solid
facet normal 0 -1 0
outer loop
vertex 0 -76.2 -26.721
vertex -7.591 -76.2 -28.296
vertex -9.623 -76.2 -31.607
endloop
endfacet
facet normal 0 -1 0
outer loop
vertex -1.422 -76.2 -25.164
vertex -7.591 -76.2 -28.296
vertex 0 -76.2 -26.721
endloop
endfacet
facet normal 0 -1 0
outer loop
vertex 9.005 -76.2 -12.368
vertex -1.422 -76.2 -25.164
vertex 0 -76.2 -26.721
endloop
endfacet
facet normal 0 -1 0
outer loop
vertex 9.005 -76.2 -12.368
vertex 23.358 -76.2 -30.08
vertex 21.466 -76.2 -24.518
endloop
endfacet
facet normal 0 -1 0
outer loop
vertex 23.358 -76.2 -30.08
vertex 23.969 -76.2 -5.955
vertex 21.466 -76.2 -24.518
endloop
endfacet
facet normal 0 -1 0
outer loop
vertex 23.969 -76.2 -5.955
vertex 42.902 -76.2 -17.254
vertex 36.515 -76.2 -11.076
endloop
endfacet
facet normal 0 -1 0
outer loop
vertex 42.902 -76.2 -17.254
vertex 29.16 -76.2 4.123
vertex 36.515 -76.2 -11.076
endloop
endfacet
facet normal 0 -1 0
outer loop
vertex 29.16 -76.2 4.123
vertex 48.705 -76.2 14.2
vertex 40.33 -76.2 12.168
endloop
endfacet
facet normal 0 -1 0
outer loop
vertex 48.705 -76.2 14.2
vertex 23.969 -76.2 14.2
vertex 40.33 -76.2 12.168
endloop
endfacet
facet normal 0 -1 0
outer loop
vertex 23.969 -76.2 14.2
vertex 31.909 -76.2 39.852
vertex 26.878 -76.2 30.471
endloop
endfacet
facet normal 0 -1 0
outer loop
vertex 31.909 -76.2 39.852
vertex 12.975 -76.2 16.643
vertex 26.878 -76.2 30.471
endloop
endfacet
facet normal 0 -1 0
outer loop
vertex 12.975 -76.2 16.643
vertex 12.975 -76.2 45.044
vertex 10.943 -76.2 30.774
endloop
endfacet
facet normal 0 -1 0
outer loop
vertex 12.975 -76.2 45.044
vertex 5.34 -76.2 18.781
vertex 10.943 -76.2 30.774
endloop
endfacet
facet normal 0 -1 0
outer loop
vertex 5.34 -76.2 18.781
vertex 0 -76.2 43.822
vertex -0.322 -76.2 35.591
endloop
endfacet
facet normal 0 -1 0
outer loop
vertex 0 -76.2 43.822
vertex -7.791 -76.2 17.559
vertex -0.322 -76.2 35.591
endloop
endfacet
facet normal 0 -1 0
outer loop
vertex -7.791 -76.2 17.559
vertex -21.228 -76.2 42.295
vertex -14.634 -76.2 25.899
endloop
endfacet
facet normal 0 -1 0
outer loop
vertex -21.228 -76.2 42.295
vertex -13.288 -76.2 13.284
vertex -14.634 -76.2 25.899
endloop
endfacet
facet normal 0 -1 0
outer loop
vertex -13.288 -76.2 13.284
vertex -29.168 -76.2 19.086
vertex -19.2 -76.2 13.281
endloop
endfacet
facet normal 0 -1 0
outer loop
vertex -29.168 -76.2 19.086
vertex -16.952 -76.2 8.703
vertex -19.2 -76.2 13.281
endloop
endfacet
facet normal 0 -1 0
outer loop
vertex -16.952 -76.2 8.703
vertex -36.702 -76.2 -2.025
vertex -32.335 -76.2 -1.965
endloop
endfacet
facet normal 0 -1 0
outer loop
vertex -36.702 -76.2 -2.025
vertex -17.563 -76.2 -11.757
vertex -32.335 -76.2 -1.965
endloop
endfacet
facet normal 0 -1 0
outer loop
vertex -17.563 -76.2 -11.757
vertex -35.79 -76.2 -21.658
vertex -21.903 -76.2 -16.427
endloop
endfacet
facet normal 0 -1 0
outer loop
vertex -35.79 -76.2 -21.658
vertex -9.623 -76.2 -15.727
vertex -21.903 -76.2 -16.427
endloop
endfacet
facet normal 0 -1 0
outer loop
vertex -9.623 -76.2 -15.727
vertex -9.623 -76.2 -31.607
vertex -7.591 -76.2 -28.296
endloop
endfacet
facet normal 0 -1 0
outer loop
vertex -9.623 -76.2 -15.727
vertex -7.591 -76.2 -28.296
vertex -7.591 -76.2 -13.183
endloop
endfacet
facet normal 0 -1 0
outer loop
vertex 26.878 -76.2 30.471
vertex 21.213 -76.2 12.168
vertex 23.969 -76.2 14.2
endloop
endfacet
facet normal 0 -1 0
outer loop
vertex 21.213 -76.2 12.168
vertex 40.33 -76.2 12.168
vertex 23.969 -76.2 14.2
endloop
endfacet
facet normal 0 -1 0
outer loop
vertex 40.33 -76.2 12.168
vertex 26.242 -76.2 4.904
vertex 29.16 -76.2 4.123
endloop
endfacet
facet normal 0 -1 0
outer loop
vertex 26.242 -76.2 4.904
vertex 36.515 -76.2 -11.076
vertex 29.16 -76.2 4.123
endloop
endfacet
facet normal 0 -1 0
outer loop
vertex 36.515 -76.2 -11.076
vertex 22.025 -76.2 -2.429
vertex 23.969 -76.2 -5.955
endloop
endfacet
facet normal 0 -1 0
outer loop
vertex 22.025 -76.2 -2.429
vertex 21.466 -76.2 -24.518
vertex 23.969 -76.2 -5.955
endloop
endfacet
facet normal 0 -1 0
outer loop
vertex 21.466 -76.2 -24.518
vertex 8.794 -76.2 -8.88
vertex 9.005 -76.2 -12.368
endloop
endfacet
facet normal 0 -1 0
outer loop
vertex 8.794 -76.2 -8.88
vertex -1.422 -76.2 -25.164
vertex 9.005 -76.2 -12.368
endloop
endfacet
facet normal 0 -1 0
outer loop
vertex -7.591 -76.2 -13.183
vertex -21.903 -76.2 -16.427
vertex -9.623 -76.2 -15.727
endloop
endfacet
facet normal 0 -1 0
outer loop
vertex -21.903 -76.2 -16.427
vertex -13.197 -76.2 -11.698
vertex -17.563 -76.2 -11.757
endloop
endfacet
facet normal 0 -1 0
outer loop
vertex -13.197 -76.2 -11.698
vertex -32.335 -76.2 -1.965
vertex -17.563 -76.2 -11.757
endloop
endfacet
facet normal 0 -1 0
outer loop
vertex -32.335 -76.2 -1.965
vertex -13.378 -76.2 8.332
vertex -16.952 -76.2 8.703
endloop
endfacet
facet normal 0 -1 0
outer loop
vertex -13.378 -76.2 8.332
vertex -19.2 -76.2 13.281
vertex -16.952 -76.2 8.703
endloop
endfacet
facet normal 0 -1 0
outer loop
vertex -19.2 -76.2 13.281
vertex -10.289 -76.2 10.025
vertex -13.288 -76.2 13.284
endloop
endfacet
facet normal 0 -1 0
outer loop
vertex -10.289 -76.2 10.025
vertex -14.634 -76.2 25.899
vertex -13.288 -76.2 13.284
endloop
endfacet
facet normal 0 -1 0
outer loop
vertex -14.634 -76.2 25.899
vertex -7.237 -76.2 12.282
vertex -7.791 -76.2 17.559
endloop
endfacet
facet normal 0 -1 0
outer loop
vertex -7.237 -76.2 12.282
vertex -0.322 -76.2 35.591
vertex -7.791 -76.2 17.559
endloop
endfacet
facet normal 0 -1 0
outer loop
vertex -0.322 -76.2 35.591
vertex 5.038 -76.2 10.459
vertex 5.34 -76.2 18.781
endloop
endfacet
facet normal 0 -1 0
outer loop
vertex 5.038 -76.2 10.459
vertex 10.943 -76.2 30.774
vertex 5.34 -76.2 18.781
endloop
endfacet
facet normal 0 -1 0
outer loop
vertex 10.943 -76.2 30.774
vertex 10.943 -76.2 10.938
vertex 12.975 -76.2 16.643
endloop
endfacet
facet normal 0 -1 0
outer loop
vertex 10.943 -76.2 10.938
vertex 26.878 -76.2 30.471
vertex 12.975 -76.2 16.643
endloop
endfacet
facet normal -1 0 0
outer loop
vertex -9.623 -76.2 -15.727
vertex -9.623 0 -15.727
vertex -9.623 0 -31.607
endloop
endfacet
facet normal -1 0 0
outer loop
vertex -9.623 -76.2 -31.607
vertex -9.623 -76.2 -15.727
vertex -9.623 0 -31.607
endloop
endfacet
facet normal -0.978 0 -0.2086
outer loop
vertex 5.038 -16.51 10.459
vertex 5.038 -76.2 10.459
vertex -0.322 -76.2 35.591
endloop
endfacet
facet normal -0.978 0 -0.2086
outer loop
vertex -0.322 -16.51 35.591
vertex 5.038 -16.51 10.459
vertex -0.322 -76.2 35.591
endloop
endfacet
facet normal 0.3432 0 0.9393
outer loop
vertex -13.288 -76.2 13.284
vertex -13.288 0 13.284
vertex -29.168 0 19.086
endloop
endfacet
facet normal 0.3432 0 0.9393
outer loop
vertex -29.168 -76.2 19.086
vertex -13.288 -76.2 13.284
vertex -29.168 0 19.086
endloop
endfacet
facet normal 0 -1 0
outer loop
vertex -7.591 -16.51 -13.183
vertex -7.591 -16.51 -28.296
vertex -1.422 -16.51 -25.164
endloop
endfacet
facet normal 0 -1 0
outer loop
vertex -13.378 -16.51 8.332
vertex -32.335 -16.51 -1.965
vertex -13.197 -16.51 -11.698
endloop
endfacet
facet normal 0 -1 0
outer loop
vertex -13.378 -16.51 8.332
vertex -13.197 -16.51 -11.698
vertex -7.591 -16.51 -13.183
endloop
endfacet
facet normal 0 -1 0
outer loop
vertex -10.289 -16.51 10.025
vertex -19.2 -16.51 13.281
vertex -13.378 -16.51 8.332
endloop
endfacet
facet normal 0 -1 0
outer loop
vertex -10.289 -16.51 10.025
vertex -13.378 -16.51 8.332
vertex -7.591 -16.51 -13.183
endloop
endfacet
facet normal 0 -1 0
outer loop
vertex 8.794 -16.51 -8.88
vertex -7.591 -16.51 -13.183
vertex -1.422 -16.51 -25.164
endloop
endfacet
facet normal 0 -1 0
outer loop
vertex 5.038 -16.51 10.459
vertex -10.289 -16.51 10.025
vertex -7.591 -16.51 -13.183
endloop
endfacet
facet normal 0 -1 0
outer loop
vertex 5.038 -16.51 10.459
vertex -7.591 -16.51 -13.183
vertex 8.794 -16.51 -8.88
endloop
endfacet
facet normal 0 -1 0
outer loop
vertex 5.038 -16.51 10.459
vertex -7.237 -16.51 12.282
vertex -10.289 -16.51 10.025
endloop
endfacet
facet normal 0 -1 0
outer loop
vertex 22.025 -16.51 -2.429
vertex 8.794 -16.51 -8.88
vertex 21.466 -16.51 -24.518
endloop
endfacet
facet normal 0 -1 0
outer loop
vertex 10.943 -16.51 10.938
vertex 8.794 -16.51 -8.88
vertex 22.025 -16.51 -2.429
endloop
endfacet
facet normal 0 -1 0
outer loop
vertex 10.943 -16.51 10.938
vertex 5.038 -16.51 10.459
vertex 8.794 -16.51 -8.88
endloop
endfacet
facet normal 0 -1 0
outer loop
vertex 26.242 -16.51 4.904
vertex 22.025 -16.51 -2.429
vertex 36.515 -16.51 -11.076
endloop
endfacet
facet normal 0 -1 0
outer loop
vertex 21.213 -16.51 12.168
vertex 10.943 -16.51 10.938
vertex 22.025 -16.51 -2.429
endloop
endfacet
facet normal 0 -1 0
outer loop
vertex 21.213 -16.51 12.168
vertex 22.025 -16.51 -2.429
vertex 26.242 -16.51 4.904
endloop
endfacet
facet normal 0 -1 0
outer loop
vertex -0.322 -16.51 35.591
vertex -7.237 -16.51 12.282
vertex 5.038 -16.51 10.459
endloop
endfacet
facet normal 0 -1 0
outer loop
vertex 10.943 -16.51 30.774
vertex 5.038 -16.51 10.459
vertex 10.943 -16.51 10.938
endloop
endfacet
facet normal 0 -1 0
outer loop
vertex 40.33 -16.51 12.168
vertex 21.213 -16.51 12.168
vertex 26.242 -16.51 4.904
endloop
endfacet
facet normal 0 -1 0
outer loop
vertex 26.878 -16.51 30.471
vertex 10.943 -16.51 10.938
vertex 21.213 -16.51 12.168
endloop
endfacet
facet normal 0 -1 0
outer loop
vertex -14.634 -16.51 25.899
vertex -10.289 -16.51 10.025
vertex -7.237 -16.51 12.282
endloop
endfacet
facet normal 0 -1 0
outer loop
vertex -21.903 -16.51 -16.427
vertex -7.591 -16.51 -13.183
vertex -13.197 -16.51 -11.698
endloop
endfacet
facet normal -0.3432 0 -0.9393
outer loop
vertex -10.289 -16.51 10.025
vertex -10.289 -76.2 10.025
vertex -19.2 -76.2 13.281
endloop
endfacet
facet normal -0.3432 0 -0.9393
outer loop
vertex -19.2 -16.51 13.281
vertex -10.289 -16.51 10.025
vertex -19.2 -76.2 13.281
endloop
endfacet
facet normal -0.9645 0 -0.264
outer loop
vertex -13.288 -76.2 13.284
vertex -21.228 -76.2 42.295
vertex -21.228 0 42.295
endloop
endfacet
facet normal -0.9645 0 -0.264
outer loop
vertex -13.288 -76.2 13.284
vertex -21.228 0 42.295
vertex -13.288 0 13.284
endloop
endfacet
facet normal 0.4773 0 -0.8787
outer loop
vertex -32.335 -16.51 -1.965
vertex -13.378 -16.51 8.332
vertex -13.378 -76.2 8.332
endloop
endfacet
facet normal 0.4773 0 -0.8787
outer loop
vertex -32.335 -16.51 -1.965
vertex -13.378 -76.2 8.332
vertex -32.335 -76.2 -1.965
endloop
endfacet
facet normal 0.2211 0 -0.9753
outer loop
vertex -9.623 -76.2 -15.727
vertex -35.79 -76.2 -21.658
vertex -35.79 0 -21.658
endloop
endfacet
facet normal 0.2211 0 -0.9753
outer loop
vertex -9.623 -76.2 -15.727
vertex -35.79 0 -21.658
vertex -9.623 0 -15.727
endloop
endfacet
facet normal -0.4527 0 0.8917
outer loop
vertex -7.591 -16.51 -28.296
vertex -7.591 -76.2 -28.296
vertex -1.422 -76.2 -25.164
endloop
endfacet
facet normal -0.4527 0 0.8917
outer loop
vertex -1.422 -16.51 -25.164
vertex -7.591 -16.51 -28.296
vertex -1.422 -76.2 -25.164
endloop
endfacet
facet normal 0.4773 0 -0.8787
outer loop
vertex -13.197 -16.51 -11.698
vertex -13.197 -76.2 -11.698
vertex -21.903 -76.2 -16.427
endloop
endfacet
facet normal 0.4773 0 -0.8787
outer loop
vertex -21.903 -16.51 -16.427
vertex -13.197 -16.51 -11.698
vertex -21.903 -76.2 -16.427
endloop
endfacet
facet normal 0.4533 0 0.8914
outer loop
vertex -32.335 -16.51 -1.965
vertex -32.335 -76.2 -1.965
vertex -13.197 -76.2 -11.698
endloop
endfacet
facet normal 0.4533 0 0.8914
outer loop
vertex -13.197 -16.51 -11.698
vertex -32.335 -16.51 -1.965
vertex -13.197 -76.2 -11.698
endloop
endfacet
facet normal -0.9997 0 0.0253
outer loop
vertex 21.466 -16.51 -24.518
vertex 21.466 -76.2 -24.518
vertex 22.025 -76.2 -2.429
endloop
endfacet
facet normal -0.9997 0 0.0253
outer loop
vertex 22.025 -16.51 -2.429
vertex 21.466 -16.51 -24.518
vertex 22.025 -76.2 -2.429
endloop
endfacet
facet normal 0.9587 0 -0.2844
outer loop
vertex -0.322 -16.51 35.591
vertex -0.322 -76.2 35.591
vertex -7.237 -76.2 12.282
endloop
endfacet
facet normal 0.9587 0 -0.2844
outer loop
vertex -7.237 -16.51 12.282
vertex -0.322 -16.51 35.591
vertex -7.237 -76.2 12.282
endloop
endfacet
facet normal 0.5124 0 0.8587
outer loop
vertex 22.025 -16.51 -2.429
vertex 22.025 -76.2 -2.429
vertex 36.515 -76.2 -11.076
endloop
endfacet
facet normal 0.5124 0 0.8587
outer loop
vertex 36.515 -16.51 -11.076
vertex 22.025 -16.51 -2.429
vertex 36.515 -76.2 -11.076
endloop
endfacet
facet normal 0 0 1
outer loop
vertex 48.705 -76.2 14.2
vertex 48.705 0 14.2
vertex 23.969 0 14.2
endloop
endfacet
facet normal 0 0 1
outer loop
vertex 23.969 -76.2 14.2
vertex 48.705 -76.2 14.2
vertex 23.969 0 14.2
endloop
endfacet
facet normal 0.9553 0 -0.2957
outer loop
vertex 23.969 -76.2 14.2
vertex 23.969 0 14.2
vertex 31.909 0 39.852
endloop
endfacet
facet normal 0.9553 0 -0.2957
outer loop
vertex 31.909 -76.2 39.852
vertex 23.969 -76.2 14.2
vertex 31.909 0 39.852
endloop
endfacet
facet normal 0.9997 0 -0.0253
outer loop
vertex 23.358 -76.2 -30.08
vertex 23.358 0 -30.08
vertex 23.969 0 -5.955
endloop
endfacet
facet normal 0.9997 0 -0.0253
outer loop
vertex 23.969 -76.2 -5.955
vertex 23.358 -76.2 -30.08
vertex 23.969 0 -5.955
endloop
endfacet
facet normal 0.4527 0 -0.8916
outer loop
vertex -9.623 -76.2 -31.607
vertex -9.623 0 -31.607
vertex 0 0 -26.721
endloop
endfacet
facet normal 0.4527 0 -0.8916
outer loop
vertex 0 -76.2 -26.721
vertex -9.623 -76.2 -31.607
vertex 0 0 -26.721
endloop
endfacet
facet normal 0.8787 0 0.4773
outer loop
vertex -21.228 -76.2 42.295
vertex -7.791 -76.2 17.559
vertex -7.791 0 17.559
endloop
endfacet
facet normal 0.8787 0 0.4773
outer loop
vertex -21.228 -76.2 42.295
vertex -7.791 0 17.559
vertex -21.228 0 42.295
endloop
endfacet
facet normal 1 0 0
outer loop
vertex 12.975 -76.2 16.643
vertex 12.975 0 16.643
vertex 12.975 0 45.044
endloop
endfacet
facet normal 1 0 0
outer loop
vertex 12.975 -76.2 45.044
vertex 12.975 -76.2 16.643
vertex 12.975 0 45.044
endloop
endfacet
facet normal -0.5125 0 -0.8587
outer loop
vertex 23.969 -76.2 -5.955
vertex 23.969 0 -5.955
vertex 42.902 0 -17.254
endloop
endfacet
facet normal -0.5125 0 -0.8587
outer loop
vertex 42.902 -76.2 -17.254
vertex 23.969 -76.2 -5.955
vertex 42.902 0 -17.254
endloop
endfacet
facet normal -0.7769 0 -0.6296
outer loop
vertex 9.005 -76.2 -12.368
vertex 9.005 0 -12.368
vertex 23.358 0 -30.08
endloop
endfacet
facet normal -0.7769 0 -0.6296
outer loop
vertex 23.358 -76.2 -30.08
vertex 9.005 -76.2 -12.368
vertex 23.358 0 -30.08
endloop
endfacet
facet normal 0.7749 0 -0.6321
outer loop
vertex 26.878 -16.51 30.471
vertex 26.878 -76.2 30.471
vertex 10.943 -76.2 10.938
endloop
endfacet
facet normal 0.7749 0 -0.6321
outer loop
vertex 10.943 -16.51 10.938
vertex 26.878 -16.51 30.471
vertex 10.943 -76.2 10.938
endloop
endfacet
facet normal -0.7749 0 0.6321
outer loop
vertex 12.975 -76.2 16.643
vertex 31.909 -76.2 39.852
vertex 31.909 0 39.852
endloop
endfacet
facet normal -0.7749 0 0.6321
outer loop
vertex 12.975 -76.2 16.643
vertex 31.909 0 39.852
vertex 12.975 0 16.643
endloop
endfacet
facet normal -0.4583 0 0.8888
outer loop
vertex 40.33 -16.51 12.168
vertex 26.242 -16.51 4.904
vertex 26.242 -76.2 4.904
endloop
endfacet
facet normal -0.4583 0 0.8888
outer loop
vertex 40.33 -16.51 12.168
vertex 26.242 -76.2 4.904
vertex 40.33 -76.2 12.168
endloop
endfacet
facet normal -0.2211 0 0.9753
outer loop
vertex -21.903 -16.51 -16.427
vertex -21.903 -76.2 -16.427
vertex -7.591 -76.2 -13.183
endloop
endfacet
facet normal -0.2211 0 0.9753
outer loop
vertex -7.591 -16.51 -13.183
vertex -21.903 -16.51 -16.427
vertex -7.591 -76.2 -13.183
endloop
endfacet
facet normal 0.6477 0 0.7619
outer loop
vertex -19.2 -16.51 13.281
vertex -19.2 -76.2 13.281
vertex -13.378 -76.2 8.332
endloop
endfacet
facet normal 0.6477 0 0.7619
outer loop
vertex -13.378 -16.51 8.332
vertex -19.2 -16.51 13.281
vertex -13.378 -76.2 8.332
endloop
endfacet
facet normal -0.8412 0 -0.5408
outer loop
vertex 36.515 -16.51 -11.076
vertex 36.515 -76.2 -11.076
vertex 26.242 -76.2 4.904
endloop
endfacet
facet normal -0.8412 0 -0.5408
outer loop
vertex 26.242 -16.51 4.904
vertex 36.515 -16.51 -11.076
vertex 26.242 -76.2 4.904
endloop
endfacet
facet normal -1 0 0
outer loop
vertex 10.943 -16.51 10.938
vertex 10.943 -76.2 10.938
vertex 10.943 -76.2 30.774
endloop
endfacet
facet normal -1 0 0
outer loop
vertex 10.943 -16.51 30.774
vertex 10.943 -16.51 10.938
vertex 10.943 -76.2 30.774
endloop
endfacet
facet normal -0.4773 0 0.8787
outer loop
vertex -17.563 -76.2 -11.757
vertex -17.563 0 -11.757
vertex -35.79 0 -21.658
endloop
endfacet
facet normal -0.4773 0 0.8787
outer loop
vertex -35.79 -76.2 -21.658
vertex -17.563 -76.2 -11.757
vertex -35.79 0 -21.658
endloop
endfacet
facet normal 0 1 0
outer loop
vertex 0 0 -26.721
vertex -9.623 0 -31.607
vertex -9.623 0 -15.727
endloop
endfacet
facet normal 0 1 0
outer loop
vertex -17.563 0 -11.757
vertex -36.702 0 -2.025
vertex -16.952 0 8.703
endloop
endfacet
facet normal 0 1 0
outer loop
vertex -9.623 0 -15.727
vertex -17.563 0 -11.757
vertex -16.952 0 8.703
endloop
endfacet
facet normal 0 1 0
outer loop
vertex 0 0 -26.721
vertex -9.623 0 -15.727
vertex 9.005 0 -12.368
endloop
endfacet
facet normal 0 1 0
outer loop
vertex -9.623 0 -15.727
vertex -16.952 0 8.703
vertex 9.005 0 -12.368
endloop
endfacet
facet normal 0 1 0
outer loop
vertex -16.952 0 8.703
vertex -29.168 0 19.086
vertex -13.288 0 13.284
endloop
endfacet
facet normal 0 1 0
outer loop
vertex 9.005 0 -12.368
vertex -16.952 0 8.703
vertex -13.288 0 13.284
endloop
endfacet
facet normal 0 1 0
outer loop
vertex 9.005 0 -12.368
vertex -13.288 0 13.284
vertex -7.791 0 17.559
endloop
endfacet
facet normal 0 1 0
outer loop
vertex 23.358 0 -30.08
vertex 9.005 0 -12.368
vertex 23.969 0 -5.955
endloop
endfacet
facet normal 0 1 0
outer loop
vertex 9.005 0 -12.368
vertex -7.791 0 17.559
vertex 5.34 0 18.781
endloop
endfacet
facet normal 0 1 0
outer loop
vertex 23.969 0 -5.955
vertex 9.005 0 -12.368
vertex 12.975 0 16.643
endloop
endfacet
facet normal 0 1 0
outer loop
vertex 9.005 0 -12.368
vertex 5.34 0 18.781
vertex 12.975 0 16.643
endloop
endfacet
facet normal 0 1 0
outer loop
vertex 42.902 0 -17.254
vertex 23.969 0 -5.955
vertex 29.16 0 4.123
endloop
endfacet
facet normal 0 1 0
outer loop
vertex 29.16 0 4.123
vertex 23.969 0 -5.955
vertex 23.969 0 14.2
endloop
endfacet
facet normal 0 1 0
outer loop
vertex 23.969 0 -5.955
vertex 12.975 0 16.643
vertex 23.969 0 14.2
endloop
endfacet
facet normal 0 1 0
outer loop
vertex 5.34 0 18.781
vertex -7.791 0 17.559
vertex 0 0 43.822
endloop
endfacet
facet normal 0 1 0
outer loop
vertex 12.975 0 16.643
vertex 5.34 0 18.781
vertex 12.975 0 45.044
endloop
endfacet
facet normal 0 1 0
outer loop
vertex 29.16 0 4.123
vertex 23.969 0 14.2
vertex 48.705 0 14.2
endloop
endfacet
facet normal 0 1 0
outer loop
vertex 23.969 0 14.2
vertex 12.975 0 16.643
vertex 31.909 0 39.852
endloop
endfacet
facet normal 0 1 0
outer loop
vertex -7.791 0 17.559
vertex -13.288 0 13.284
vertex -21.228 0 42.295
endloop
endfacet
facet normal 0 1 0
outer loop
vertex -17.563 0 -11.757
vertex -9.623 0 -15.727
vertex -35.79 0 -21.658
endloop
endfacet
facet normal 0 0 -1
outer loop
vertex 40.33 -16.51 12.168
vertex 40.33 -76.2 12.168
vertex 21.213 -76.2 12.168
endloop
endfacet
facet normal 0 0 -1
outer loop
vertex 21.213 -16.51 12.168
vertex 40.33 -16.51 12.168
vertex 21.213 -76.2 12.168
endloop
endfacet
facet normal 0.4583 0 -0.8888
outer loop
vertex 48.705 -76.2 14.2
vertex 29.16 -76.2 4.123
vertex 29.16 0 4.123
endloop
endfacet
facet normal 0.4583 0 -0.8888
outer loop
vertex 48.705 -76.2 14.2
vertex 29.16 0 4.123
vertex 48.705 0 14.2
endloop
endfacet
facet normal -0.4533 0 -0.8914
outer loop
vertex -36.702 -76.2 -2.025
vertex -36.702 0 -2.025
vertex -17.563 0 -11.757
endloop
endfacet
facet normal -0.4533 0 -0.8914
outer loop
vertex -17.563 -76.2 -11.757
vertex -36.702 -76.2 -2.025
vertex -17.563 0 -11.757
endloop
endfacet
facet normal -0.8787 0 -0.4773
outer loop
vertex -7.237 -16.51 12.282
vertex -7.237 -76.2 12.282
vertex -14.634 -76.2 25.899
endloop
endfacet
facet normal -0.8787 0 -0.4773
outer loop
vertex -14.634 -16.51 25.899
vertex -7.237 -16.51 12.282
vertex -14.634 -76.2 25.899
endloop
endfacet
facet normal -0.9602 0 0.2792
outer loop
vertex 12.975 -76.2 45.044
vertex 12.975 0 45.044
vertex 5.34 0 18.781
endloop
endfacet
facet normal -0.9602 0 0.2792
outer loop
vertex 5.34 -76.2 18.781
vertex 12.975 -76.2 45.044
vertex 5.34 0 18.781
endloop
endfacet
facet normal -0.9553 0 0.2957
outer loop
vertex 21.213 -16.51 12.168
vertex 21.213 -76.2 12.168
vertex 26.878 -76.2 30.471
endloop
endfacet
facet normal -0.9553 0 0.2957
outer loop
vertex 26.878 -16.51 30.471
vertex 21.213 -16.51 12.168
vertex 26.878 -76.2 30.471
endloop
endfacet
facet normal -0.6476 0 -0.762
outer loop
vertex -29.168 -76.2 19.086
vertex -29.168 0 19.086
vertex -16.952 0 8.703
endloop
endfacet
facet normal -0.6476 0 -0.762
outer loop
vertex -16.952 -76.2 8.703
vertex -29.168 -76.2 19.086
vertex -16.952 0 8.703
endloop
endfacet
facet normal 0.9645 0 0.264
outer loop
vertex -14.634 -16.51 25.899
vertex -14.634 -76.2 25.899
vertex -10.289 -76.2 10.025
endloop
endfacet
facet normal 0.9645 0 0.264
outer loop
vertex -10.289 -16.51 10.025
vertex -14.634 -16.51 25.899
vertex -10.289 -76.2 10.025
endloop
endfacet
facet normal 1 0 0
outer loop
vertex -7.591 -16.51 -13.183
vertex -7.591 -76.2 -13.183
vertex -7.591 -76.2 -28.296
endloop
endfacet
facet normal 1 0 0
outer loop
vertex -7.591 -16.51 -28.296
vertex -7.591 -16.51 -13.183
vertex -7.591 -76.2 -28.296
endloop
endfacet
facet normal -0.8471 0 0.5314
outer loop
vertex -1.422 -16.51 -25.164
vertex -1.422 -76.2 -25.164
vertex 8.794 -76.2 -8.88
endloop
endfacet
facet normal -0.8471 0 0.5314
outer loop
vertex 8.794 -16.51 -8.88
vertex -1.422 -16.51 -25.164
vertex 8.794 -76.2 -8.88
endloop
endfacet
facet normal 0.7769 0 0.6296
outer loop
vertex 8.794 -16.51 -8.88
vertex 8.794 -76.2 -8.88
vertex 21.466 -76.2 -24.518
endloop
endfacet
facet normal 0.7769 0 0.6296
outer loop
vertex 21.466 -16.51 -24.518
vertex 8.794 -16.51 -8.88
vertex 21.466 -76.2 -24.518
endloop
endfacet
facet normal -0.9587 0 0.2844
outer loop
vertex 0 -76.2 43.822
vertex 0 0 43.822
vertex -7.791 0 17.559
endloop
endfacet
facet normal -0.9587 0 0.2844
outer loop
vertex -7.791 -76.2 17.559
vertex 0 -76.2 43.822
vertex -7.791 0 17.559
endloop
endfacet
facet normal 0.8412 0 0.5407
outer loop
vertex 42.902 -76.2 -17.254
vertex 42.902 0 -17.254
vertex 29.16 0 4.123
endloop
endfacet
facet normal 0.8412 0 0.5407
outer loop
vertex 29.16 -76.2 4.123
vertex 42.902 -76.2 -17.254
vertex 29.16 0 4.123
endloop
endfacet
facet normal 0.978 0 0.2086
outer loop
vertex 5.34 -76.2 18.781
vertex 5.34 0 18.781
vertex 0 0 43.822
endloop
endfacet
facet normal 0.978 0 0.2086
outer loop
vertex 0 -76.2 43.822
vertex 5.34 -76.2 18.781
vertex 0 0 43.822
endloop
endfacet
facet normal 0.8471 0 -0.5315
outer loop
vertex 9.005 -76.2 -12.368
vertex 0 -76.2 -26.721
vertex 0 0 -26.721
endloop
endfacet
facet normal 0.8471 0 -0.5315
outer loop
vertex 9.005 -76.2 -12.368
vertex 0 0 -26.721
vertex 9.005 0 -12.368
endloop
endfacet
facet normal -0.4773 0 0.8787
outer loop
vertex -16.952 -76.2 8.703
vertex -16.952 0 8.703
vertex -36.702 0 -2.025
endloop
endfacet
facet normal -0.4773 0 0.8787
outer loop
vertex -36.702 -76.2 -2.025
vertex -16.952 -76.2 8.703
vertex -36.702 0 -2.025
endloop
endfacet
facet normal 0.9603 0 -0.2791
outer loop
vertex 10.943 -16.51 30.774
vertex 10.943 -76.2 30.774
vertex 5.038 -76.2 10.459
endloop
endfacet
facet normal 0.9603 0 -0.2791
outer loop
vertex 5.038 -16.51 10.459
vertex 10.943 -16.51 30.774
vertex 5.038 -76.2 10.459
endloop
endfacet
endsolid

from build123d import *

# Parameters (mm, degrees)
F1_DEPTH = 76.2
F3_DEPTH = 59.69


with BuildPart() as f1:
    # F0 (on Front) → F1 (new body)
    with BuildSketch(Plane.XZ):
        Polygon((-9.623217, -31.607002), (0, -26.720898), (9.005067, -12.367957), (23.358002, -30.080097), (23.968766, -5.954943), (42.902432, -17.254066), (29.160259, 4.122653), (48.704684, 14.200249), (23.968766, 14.200249), (31.908695, 39.85231), (12.975028, 16.643301), (12.975028, 45.043796), (5.340484, 18.780973), (0, 43.822274), (-7.790928, 17.559446), (-21.227721, 42.295363), (-13.287797, 13.284104), (-29.167645, 19.086355), (-16.952377, 8.703378), (-36.70152, -2.024551), (-17.56314, -11.757195), (-35.789758, -21.658073), (-9.623217, -15.727157), align=None)
    extrude(amount=F1_DEPTH)

    # F2 (on face) → F3 (cut)
    with BuildSketch(Plane.XZ.offset(76.2)):
        Polygon((21.212701, 12.168249), (26.877798, 30.47086), (10.943028, 10.937917), (10.943028, 30.774279), (5.037519, 10.459334), (-0.322264, 35.591124), (-7.236843, 12.282424), (-14.633635, 25.899247), (-10.289114, 10.025038), (-19.200415, 13.281089), (-13.378382, 8.332362), (-32.335366, -1.965259), (-13.196986, -11.697903), (-21.902551, -16.426851), (-7.591217, -13.18304), (-7.591217, -28.296349), (-1.422014, -25.16399), (8.794351, -8.880393), (21.466165, -24.517956), (22.025383, -2.428849), (36.515134, -11.075958), (26.24216, 4.904228), (40.329954, 12.168249), align=None)
    extrude(amount=-F3_DEPTH, mode=Mode.SUBTRACT)


solid = f1.part
